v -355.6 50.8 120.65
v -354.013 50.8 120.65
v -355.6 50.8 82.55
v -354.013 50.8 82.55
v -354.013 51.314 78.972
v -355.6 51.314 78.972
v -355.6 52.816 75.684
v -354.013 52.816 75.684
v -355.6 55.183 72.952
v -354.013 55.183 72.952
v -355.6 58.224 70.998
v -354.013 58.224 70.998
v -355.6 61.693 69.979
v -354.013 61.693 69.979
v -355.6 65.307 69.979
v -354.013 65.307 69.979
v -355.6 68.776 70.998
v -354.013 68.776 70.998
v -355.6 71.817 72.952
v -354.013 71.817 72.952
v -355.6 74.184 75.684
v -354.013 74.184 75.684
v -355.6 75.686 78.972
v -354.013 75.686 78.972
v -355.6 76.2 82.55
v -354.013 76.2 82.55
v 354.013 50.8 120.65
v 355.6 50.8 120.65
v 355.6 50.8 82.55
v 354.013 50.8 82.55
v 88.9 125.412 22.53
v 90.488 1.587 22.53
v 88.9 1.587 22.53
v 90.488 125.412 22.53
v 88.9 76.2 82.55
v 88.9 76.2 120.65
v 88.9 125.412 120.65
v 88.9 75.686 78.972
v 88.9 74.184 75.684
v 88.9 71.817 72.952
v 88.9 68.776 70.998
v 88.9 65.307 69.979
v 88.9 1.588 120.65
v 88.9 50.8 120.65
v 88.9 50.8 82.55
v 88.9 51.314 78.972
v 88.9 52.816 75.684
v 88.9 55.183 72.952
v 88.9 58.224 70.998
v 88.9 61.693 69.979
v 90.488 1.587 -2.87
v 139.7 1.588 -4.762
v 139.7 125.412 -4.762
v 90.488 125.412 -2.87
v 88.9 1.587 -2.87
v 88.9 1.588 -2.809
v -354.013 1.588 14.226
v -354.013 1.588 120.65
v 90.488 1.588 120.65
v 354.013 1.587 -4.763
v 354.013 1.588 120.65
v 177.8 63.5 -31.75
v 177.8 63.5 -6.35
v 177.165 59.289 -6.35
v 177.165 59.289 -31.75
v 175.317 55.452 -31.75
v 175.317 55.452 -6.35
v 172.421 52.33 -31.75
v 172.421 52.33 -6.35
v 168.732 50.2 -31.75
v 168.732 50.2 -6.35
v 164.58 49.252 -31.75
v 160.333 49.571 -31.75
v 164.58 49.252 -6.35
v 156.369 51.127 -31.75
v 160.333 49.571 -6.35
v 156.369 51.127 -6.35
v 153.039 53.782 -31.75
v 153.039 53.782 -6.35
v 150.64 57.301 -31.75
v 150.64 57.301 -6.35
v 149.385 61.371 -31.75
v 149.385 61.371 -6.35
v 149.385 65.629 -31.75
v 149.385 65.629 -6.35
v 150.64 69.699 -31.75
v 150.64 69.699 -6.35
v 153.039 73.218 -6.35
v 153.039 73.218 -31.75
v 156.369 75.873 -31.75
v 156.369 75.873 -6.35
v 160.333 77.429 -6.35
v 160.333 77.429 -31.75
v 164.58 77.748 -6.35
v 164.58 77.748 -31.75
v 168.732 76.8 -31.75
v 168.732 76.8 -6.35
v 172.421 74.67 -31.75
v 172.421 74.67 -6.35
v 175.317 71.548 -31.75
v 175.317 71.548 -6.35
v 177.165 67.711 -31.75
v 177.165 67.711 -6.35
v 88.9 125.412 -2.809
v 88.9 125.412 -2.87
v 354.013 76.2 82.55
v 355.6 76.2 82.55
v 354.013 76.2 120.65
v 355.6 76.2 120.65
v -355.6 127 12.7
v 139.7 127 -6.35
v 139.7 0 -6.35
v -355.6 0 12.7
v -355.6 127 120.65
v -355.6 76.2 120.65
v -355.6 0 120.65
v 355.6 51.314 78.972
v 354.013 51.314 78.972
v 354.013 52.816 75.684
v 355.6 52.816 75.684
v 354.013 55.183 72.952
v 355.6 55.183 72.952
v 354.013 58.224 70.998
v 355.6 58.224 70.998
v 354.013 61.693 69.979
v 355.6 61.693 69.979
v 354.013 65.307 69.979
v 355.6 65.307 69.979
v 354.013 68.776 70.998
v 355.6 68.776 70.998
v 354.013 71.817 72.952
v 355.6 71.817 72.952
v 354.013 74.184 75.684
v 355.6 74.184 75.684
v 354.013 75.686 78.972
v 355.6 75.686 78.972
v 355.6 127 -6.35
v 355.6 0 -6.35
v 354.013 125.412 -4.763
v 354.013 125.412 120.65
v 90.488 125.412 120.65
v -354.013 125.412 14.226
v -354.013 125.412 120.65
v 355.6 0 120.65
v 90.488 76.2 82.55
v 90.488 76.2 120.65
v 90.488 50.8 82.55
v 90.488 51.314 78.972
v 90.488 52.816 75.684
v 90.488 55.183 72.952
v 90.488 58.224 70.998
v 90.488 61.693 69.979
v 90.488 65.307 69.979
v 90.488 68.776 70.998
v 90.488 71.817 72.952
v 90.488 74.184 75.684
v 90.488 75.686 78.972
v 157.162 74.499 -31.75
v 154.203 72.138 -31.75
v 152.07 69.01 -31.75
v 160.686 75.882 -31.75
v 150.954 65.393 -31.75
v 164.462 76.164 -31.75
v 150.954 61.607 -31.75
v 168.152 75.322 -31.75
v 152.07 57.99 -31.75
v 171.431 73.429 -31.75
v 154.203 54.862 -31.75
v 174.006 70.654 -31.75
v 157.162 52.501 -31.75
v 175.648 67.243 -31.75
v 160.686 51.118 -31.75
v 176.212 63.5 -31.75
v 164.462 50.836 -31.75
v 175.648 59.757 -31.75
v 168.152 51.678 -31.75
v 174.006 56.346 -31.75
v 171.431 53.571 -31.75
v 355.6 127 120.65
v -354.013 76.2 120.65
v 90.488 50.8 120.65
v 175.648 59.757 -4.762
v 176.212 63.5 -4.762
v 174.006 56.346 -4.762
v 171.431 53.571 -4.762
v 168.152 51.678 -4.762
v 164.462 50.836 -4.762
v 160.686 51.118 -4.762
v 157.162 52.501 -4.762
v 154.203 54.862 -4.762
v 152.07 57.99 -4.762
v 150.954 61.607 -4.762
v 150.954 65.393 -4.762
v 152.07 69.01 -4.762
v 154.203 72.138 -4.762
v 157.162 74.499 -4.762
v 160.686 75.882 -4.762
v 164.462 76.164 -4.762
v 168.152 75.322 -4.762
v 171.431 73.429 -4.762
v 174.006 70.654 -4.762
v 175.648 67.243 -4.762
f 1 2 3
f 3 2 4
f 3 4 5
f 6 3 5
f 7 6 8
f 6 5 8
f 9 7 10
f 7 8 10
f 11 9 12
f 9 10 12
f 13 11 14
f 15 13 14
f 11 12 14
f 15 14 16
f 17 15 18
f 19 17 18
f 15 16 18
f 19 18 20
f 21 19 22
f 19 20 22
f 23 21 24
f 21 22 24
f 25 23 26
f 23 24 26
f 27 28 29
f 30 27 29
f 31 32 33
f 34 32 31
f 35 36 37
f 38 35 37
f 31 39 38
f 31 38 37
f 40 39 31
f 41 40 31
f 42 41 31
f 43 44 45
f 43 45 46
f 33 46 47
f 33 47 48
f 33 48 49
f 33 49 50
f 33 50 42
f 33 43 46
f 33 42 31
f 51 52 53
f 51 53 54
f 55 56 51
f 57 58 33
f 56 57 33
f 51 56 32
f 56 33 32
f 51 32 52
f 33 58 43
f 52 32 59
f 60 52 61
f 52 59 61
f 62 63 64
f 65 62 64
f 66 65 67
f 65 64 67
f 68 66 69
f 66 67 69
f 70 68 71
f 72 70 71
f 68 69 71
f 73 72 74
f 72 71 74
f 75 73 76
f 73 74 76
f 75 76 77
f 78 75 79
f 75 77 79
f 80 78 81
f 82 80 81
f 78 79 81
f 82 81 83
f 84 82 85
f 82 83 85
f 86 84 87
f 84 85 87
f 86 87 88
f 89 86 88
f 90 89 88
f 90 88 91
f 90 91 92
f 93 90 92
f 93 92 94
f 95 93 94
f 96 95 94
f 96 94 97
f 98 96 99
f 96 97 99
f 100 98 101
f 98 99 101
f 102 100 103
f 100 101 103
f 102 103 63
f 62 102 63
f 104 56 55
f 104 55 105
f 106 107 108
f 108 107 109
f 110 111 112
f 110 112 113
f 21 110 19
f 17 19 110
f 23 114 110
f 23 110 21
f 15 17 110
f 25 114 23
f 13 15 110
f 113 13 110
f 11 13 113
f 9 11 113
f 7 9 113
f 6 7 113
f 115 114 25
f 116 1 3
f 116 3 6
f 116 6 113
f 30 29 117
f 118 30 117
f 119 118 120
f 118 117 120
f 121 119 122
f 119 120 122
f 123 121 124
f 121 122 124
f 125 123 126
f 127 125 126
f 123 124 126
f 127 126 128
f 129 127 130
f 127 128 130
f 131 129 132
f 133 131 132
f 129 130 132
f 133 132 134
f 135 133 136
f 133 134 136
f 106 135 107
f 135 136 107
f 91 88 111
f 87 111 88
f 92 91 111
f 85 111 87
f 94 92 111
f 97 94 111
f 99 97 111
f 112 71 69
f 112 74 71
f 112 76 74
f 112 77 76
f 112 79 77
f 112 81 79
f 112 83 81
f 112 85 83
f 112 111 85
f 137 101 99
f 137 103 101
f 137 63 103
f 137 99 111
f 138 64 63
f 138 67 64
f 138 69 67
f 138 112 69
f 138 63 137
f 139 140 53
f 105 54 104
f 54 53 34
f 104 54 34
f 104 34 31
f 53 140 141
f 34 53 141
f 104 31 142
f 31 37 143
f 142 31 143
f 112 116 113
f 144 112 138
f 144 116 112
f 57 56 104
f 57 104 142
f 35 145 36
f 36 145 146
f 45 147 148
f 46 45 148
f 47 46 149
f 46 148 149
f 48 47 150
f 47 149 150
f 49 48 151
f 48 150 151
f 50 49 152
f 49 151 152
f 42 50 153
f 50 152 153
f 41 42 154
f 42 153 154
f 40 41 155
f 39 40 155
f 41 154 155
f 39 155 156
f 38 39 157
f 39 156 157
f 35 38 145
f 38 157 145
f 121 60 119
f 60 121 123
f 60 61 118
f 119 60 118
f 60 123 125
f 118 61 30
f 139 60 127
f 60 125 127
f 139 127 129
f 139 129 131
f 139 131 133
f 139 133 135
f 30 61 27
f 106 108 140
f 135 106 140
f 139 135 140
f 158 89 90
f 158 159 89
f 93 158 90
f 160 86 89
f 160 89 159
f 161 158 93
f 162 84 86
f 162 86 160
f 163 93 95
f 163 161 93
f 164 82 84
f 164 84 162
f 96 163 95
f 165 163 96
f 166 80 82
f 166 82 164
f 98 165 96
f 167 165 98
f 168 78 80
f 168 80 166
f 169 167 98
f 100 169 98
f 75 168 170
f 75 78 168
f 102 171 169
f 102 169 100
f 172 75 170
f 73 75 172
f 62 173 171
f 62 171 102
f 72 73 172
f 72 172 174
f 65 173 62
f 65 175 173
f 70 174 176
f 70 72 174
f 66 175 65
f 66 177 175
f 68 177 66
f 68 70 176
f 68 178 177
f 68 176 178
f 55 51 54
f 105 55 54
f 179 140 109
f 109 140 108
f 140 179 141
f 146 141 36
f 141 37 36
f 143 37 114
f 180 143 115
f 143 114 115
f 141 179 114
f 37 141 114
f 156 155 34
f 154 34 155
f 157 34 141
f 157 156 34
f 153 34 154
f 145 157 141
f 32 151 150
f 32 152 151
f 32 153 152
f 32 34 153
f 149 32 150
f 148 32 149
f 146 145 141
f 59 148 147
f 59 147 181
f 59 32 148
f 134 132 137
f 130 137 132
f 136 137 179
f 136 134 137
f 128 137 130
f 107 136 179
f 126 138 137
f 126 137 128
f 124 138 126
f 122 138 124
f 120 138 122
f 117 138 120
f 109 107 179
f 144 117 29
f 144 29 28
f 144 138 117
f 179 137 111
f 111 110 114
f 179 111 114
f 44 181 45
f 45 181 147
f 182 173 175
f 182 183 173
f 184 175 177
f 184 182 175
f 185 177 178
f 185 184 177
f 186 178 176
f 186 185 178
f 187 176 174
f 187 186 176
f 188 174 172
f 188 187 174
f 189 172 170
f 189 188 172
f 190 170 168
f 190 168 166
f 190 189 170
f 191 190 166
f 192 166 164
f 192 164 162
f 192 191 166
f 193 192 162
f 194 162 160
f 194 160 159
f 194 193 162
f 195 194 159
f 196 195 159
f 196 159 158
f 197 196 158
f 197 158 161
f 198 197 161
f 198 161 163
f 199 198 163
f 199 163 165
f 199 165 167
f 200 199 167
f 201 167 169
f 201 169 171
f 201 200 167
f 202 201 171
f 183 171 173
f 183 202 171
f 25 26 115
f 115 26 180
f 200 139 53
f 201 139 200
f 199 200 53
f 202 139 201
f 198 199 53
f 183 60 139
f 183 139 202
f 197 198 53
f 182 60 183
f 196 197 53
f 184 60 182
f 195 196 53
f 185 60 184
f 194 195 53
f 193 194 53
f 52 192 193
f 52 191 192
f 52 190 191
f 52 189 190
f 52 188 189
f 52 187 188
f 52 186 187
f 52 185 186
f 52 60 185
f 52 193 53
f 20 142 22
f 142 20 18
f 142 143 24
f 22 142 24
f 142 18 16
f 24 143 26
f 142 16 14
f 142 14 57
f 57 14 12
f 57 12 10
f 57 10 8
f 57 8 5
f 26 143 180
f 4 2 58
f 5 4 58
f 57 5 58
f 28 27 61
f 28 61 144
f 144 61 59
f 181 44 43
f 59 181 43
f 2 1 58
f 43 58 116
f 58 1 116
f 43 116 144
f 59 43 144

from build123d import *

# Parameters (mm, degrees)
F1_DEPTH  = 1.5875
F2_W      = 125.4125
F2_H      = 107.95
F3_DEPTH  = 1.5875
F4_W      = 127
F4_H      = 127
F4_W_2    = 125.4125
F5_DEPTH  = 1.5875
F7_DEPTH  = 1.5875
F9_DEPTH  = 127
F11_DEPTH = 127
F13_DEPTH = 711.201
F14_R     = 12.7
F15_DEPTH = 25.4
F16_R     = 14.2875
F16_R_2   = 12.7
F17_DEPTH = 25.4
F18_W     = 123.825
F18_H     = 25.4
F19_DEPTH = 1.5875


with BuildPart() as f1:
    # F0 (on Front) → F1 (new body)
    with BuildSketch(Plane.XZ):
        Polygon((355.6, 120.65), (-355.6, 120.65), (-355.6, 12.7), (139.7, -6.35), (355.6, -6.35), align=None)
    extrude(amount=-F1_DEPTH)

    # F2 (on face) → F3 (join)
    with BuildSketch(Plane(origin=(-355.6, 0, 0), x_dir=(0, -1, 0), z_dir=(-1, 0, 0))):
        with Locations((-64.29375, 66.675)):
            Rectangle(F2_W, F2_H)
    extrude(amount=-F3_DEPTH)

    # F4 (on face) → F5 (join)
    with BuildSketch(Plane.YZ.offset(355.6)):
        with Locations((63.5, 57.15)):
            Rectangle(F4_W, F4_H)
        with Locations((64.29375, 57.15)):
            Rectangle(F4_W_2, F4_H)
    extrude(amount=-F5_DEPTH)

    # F6 (on face) → F7 (join)
    with BuildSketch(Plane(origin=(0, 127, 0), x_dir=(-1, 0, 0), z_dir=(0, 1, 0))):
        Polygon((355.6, 12.7), (355.6, 120.65), (-355.6, 120.65), (-355.6, -6.35), (-139.7, -6.35), align=None)
    extrude(amount=-F7_DEPTH)

    # F8 (on face) → F9 (join)
    with BuildSketch(Plane.XZ):
        Polygon((-355.6, 14.2875), (-355.6, 12.7), (139.7, -6.35), (355.6, -6.35), (355.6, -4.7625), (139.7, -4.7625), align=None)
    extrude(amount=-F9_DEPTH)

    # F10 (on face) → F11 (join)
    with BuildSketch(Plane.XZ):
        Polygon((90.4875, 120.65), (88.9, 120.65), (88.9, -4.396154), (90.4875, -4.457212), align=None)
    extrude(amount=-F11_DEPTH)

    # F12 (on face) → F13 (cut, through all)
    with BuildSketch(Plane.YZ.offset(355.6)):
        with BuildLine():
            Line((50.8, 120.65), (50.8, 82.55))
            ThreePointArc((50.8, 82.55), (63.5, 69.85), (76.2, 82.55))
            Line((76.2, 82.55), (76.2, 120.65))
            Line((76.2, 120.65), (63.5, 120.65))
            Line((63.5, 120.65), (50.8, 120.65))
        make_face()
    extrude(amount=-F13_DEPTH, mode=Mode.SUBTRACT)

    # F14 (on face) → F15 (cut)
    with BuildSketch(Plane.XY.offset(-4.7625)):
        with Locations((163.5125, 63.5)):
            Circle(F14_R)
    extrude(amount=-F15_DEPTH, mode=Mode.SUBTRACT)

    # F16 (on face) → F17 (join)
    with BuildSketch(Plane(origin=(0, 0, -6.35), x_dir=(1, 0, 0), z_dir=(0, 0, -1))):
        with Locations((163.5125, -63.5)):
            Circle(F16_R)
        with Locations((163.5125, -63.5)):
            Circle(F16_R_2, mode=Mode.SUBTRACT)
    extrude(amount=F17_DEPTH)

    # F18 (on face) → F19 (cut)
    with BuildSketch(Plane.YZ.offset(90.4875)):
        with Locations((63.5, 9.830288)):
            Rectangle(F18_W, F18_H)
    extrude(amount=-F19_DEPTH, mode=Mode.SUBTRACT)


solid = f1.part
